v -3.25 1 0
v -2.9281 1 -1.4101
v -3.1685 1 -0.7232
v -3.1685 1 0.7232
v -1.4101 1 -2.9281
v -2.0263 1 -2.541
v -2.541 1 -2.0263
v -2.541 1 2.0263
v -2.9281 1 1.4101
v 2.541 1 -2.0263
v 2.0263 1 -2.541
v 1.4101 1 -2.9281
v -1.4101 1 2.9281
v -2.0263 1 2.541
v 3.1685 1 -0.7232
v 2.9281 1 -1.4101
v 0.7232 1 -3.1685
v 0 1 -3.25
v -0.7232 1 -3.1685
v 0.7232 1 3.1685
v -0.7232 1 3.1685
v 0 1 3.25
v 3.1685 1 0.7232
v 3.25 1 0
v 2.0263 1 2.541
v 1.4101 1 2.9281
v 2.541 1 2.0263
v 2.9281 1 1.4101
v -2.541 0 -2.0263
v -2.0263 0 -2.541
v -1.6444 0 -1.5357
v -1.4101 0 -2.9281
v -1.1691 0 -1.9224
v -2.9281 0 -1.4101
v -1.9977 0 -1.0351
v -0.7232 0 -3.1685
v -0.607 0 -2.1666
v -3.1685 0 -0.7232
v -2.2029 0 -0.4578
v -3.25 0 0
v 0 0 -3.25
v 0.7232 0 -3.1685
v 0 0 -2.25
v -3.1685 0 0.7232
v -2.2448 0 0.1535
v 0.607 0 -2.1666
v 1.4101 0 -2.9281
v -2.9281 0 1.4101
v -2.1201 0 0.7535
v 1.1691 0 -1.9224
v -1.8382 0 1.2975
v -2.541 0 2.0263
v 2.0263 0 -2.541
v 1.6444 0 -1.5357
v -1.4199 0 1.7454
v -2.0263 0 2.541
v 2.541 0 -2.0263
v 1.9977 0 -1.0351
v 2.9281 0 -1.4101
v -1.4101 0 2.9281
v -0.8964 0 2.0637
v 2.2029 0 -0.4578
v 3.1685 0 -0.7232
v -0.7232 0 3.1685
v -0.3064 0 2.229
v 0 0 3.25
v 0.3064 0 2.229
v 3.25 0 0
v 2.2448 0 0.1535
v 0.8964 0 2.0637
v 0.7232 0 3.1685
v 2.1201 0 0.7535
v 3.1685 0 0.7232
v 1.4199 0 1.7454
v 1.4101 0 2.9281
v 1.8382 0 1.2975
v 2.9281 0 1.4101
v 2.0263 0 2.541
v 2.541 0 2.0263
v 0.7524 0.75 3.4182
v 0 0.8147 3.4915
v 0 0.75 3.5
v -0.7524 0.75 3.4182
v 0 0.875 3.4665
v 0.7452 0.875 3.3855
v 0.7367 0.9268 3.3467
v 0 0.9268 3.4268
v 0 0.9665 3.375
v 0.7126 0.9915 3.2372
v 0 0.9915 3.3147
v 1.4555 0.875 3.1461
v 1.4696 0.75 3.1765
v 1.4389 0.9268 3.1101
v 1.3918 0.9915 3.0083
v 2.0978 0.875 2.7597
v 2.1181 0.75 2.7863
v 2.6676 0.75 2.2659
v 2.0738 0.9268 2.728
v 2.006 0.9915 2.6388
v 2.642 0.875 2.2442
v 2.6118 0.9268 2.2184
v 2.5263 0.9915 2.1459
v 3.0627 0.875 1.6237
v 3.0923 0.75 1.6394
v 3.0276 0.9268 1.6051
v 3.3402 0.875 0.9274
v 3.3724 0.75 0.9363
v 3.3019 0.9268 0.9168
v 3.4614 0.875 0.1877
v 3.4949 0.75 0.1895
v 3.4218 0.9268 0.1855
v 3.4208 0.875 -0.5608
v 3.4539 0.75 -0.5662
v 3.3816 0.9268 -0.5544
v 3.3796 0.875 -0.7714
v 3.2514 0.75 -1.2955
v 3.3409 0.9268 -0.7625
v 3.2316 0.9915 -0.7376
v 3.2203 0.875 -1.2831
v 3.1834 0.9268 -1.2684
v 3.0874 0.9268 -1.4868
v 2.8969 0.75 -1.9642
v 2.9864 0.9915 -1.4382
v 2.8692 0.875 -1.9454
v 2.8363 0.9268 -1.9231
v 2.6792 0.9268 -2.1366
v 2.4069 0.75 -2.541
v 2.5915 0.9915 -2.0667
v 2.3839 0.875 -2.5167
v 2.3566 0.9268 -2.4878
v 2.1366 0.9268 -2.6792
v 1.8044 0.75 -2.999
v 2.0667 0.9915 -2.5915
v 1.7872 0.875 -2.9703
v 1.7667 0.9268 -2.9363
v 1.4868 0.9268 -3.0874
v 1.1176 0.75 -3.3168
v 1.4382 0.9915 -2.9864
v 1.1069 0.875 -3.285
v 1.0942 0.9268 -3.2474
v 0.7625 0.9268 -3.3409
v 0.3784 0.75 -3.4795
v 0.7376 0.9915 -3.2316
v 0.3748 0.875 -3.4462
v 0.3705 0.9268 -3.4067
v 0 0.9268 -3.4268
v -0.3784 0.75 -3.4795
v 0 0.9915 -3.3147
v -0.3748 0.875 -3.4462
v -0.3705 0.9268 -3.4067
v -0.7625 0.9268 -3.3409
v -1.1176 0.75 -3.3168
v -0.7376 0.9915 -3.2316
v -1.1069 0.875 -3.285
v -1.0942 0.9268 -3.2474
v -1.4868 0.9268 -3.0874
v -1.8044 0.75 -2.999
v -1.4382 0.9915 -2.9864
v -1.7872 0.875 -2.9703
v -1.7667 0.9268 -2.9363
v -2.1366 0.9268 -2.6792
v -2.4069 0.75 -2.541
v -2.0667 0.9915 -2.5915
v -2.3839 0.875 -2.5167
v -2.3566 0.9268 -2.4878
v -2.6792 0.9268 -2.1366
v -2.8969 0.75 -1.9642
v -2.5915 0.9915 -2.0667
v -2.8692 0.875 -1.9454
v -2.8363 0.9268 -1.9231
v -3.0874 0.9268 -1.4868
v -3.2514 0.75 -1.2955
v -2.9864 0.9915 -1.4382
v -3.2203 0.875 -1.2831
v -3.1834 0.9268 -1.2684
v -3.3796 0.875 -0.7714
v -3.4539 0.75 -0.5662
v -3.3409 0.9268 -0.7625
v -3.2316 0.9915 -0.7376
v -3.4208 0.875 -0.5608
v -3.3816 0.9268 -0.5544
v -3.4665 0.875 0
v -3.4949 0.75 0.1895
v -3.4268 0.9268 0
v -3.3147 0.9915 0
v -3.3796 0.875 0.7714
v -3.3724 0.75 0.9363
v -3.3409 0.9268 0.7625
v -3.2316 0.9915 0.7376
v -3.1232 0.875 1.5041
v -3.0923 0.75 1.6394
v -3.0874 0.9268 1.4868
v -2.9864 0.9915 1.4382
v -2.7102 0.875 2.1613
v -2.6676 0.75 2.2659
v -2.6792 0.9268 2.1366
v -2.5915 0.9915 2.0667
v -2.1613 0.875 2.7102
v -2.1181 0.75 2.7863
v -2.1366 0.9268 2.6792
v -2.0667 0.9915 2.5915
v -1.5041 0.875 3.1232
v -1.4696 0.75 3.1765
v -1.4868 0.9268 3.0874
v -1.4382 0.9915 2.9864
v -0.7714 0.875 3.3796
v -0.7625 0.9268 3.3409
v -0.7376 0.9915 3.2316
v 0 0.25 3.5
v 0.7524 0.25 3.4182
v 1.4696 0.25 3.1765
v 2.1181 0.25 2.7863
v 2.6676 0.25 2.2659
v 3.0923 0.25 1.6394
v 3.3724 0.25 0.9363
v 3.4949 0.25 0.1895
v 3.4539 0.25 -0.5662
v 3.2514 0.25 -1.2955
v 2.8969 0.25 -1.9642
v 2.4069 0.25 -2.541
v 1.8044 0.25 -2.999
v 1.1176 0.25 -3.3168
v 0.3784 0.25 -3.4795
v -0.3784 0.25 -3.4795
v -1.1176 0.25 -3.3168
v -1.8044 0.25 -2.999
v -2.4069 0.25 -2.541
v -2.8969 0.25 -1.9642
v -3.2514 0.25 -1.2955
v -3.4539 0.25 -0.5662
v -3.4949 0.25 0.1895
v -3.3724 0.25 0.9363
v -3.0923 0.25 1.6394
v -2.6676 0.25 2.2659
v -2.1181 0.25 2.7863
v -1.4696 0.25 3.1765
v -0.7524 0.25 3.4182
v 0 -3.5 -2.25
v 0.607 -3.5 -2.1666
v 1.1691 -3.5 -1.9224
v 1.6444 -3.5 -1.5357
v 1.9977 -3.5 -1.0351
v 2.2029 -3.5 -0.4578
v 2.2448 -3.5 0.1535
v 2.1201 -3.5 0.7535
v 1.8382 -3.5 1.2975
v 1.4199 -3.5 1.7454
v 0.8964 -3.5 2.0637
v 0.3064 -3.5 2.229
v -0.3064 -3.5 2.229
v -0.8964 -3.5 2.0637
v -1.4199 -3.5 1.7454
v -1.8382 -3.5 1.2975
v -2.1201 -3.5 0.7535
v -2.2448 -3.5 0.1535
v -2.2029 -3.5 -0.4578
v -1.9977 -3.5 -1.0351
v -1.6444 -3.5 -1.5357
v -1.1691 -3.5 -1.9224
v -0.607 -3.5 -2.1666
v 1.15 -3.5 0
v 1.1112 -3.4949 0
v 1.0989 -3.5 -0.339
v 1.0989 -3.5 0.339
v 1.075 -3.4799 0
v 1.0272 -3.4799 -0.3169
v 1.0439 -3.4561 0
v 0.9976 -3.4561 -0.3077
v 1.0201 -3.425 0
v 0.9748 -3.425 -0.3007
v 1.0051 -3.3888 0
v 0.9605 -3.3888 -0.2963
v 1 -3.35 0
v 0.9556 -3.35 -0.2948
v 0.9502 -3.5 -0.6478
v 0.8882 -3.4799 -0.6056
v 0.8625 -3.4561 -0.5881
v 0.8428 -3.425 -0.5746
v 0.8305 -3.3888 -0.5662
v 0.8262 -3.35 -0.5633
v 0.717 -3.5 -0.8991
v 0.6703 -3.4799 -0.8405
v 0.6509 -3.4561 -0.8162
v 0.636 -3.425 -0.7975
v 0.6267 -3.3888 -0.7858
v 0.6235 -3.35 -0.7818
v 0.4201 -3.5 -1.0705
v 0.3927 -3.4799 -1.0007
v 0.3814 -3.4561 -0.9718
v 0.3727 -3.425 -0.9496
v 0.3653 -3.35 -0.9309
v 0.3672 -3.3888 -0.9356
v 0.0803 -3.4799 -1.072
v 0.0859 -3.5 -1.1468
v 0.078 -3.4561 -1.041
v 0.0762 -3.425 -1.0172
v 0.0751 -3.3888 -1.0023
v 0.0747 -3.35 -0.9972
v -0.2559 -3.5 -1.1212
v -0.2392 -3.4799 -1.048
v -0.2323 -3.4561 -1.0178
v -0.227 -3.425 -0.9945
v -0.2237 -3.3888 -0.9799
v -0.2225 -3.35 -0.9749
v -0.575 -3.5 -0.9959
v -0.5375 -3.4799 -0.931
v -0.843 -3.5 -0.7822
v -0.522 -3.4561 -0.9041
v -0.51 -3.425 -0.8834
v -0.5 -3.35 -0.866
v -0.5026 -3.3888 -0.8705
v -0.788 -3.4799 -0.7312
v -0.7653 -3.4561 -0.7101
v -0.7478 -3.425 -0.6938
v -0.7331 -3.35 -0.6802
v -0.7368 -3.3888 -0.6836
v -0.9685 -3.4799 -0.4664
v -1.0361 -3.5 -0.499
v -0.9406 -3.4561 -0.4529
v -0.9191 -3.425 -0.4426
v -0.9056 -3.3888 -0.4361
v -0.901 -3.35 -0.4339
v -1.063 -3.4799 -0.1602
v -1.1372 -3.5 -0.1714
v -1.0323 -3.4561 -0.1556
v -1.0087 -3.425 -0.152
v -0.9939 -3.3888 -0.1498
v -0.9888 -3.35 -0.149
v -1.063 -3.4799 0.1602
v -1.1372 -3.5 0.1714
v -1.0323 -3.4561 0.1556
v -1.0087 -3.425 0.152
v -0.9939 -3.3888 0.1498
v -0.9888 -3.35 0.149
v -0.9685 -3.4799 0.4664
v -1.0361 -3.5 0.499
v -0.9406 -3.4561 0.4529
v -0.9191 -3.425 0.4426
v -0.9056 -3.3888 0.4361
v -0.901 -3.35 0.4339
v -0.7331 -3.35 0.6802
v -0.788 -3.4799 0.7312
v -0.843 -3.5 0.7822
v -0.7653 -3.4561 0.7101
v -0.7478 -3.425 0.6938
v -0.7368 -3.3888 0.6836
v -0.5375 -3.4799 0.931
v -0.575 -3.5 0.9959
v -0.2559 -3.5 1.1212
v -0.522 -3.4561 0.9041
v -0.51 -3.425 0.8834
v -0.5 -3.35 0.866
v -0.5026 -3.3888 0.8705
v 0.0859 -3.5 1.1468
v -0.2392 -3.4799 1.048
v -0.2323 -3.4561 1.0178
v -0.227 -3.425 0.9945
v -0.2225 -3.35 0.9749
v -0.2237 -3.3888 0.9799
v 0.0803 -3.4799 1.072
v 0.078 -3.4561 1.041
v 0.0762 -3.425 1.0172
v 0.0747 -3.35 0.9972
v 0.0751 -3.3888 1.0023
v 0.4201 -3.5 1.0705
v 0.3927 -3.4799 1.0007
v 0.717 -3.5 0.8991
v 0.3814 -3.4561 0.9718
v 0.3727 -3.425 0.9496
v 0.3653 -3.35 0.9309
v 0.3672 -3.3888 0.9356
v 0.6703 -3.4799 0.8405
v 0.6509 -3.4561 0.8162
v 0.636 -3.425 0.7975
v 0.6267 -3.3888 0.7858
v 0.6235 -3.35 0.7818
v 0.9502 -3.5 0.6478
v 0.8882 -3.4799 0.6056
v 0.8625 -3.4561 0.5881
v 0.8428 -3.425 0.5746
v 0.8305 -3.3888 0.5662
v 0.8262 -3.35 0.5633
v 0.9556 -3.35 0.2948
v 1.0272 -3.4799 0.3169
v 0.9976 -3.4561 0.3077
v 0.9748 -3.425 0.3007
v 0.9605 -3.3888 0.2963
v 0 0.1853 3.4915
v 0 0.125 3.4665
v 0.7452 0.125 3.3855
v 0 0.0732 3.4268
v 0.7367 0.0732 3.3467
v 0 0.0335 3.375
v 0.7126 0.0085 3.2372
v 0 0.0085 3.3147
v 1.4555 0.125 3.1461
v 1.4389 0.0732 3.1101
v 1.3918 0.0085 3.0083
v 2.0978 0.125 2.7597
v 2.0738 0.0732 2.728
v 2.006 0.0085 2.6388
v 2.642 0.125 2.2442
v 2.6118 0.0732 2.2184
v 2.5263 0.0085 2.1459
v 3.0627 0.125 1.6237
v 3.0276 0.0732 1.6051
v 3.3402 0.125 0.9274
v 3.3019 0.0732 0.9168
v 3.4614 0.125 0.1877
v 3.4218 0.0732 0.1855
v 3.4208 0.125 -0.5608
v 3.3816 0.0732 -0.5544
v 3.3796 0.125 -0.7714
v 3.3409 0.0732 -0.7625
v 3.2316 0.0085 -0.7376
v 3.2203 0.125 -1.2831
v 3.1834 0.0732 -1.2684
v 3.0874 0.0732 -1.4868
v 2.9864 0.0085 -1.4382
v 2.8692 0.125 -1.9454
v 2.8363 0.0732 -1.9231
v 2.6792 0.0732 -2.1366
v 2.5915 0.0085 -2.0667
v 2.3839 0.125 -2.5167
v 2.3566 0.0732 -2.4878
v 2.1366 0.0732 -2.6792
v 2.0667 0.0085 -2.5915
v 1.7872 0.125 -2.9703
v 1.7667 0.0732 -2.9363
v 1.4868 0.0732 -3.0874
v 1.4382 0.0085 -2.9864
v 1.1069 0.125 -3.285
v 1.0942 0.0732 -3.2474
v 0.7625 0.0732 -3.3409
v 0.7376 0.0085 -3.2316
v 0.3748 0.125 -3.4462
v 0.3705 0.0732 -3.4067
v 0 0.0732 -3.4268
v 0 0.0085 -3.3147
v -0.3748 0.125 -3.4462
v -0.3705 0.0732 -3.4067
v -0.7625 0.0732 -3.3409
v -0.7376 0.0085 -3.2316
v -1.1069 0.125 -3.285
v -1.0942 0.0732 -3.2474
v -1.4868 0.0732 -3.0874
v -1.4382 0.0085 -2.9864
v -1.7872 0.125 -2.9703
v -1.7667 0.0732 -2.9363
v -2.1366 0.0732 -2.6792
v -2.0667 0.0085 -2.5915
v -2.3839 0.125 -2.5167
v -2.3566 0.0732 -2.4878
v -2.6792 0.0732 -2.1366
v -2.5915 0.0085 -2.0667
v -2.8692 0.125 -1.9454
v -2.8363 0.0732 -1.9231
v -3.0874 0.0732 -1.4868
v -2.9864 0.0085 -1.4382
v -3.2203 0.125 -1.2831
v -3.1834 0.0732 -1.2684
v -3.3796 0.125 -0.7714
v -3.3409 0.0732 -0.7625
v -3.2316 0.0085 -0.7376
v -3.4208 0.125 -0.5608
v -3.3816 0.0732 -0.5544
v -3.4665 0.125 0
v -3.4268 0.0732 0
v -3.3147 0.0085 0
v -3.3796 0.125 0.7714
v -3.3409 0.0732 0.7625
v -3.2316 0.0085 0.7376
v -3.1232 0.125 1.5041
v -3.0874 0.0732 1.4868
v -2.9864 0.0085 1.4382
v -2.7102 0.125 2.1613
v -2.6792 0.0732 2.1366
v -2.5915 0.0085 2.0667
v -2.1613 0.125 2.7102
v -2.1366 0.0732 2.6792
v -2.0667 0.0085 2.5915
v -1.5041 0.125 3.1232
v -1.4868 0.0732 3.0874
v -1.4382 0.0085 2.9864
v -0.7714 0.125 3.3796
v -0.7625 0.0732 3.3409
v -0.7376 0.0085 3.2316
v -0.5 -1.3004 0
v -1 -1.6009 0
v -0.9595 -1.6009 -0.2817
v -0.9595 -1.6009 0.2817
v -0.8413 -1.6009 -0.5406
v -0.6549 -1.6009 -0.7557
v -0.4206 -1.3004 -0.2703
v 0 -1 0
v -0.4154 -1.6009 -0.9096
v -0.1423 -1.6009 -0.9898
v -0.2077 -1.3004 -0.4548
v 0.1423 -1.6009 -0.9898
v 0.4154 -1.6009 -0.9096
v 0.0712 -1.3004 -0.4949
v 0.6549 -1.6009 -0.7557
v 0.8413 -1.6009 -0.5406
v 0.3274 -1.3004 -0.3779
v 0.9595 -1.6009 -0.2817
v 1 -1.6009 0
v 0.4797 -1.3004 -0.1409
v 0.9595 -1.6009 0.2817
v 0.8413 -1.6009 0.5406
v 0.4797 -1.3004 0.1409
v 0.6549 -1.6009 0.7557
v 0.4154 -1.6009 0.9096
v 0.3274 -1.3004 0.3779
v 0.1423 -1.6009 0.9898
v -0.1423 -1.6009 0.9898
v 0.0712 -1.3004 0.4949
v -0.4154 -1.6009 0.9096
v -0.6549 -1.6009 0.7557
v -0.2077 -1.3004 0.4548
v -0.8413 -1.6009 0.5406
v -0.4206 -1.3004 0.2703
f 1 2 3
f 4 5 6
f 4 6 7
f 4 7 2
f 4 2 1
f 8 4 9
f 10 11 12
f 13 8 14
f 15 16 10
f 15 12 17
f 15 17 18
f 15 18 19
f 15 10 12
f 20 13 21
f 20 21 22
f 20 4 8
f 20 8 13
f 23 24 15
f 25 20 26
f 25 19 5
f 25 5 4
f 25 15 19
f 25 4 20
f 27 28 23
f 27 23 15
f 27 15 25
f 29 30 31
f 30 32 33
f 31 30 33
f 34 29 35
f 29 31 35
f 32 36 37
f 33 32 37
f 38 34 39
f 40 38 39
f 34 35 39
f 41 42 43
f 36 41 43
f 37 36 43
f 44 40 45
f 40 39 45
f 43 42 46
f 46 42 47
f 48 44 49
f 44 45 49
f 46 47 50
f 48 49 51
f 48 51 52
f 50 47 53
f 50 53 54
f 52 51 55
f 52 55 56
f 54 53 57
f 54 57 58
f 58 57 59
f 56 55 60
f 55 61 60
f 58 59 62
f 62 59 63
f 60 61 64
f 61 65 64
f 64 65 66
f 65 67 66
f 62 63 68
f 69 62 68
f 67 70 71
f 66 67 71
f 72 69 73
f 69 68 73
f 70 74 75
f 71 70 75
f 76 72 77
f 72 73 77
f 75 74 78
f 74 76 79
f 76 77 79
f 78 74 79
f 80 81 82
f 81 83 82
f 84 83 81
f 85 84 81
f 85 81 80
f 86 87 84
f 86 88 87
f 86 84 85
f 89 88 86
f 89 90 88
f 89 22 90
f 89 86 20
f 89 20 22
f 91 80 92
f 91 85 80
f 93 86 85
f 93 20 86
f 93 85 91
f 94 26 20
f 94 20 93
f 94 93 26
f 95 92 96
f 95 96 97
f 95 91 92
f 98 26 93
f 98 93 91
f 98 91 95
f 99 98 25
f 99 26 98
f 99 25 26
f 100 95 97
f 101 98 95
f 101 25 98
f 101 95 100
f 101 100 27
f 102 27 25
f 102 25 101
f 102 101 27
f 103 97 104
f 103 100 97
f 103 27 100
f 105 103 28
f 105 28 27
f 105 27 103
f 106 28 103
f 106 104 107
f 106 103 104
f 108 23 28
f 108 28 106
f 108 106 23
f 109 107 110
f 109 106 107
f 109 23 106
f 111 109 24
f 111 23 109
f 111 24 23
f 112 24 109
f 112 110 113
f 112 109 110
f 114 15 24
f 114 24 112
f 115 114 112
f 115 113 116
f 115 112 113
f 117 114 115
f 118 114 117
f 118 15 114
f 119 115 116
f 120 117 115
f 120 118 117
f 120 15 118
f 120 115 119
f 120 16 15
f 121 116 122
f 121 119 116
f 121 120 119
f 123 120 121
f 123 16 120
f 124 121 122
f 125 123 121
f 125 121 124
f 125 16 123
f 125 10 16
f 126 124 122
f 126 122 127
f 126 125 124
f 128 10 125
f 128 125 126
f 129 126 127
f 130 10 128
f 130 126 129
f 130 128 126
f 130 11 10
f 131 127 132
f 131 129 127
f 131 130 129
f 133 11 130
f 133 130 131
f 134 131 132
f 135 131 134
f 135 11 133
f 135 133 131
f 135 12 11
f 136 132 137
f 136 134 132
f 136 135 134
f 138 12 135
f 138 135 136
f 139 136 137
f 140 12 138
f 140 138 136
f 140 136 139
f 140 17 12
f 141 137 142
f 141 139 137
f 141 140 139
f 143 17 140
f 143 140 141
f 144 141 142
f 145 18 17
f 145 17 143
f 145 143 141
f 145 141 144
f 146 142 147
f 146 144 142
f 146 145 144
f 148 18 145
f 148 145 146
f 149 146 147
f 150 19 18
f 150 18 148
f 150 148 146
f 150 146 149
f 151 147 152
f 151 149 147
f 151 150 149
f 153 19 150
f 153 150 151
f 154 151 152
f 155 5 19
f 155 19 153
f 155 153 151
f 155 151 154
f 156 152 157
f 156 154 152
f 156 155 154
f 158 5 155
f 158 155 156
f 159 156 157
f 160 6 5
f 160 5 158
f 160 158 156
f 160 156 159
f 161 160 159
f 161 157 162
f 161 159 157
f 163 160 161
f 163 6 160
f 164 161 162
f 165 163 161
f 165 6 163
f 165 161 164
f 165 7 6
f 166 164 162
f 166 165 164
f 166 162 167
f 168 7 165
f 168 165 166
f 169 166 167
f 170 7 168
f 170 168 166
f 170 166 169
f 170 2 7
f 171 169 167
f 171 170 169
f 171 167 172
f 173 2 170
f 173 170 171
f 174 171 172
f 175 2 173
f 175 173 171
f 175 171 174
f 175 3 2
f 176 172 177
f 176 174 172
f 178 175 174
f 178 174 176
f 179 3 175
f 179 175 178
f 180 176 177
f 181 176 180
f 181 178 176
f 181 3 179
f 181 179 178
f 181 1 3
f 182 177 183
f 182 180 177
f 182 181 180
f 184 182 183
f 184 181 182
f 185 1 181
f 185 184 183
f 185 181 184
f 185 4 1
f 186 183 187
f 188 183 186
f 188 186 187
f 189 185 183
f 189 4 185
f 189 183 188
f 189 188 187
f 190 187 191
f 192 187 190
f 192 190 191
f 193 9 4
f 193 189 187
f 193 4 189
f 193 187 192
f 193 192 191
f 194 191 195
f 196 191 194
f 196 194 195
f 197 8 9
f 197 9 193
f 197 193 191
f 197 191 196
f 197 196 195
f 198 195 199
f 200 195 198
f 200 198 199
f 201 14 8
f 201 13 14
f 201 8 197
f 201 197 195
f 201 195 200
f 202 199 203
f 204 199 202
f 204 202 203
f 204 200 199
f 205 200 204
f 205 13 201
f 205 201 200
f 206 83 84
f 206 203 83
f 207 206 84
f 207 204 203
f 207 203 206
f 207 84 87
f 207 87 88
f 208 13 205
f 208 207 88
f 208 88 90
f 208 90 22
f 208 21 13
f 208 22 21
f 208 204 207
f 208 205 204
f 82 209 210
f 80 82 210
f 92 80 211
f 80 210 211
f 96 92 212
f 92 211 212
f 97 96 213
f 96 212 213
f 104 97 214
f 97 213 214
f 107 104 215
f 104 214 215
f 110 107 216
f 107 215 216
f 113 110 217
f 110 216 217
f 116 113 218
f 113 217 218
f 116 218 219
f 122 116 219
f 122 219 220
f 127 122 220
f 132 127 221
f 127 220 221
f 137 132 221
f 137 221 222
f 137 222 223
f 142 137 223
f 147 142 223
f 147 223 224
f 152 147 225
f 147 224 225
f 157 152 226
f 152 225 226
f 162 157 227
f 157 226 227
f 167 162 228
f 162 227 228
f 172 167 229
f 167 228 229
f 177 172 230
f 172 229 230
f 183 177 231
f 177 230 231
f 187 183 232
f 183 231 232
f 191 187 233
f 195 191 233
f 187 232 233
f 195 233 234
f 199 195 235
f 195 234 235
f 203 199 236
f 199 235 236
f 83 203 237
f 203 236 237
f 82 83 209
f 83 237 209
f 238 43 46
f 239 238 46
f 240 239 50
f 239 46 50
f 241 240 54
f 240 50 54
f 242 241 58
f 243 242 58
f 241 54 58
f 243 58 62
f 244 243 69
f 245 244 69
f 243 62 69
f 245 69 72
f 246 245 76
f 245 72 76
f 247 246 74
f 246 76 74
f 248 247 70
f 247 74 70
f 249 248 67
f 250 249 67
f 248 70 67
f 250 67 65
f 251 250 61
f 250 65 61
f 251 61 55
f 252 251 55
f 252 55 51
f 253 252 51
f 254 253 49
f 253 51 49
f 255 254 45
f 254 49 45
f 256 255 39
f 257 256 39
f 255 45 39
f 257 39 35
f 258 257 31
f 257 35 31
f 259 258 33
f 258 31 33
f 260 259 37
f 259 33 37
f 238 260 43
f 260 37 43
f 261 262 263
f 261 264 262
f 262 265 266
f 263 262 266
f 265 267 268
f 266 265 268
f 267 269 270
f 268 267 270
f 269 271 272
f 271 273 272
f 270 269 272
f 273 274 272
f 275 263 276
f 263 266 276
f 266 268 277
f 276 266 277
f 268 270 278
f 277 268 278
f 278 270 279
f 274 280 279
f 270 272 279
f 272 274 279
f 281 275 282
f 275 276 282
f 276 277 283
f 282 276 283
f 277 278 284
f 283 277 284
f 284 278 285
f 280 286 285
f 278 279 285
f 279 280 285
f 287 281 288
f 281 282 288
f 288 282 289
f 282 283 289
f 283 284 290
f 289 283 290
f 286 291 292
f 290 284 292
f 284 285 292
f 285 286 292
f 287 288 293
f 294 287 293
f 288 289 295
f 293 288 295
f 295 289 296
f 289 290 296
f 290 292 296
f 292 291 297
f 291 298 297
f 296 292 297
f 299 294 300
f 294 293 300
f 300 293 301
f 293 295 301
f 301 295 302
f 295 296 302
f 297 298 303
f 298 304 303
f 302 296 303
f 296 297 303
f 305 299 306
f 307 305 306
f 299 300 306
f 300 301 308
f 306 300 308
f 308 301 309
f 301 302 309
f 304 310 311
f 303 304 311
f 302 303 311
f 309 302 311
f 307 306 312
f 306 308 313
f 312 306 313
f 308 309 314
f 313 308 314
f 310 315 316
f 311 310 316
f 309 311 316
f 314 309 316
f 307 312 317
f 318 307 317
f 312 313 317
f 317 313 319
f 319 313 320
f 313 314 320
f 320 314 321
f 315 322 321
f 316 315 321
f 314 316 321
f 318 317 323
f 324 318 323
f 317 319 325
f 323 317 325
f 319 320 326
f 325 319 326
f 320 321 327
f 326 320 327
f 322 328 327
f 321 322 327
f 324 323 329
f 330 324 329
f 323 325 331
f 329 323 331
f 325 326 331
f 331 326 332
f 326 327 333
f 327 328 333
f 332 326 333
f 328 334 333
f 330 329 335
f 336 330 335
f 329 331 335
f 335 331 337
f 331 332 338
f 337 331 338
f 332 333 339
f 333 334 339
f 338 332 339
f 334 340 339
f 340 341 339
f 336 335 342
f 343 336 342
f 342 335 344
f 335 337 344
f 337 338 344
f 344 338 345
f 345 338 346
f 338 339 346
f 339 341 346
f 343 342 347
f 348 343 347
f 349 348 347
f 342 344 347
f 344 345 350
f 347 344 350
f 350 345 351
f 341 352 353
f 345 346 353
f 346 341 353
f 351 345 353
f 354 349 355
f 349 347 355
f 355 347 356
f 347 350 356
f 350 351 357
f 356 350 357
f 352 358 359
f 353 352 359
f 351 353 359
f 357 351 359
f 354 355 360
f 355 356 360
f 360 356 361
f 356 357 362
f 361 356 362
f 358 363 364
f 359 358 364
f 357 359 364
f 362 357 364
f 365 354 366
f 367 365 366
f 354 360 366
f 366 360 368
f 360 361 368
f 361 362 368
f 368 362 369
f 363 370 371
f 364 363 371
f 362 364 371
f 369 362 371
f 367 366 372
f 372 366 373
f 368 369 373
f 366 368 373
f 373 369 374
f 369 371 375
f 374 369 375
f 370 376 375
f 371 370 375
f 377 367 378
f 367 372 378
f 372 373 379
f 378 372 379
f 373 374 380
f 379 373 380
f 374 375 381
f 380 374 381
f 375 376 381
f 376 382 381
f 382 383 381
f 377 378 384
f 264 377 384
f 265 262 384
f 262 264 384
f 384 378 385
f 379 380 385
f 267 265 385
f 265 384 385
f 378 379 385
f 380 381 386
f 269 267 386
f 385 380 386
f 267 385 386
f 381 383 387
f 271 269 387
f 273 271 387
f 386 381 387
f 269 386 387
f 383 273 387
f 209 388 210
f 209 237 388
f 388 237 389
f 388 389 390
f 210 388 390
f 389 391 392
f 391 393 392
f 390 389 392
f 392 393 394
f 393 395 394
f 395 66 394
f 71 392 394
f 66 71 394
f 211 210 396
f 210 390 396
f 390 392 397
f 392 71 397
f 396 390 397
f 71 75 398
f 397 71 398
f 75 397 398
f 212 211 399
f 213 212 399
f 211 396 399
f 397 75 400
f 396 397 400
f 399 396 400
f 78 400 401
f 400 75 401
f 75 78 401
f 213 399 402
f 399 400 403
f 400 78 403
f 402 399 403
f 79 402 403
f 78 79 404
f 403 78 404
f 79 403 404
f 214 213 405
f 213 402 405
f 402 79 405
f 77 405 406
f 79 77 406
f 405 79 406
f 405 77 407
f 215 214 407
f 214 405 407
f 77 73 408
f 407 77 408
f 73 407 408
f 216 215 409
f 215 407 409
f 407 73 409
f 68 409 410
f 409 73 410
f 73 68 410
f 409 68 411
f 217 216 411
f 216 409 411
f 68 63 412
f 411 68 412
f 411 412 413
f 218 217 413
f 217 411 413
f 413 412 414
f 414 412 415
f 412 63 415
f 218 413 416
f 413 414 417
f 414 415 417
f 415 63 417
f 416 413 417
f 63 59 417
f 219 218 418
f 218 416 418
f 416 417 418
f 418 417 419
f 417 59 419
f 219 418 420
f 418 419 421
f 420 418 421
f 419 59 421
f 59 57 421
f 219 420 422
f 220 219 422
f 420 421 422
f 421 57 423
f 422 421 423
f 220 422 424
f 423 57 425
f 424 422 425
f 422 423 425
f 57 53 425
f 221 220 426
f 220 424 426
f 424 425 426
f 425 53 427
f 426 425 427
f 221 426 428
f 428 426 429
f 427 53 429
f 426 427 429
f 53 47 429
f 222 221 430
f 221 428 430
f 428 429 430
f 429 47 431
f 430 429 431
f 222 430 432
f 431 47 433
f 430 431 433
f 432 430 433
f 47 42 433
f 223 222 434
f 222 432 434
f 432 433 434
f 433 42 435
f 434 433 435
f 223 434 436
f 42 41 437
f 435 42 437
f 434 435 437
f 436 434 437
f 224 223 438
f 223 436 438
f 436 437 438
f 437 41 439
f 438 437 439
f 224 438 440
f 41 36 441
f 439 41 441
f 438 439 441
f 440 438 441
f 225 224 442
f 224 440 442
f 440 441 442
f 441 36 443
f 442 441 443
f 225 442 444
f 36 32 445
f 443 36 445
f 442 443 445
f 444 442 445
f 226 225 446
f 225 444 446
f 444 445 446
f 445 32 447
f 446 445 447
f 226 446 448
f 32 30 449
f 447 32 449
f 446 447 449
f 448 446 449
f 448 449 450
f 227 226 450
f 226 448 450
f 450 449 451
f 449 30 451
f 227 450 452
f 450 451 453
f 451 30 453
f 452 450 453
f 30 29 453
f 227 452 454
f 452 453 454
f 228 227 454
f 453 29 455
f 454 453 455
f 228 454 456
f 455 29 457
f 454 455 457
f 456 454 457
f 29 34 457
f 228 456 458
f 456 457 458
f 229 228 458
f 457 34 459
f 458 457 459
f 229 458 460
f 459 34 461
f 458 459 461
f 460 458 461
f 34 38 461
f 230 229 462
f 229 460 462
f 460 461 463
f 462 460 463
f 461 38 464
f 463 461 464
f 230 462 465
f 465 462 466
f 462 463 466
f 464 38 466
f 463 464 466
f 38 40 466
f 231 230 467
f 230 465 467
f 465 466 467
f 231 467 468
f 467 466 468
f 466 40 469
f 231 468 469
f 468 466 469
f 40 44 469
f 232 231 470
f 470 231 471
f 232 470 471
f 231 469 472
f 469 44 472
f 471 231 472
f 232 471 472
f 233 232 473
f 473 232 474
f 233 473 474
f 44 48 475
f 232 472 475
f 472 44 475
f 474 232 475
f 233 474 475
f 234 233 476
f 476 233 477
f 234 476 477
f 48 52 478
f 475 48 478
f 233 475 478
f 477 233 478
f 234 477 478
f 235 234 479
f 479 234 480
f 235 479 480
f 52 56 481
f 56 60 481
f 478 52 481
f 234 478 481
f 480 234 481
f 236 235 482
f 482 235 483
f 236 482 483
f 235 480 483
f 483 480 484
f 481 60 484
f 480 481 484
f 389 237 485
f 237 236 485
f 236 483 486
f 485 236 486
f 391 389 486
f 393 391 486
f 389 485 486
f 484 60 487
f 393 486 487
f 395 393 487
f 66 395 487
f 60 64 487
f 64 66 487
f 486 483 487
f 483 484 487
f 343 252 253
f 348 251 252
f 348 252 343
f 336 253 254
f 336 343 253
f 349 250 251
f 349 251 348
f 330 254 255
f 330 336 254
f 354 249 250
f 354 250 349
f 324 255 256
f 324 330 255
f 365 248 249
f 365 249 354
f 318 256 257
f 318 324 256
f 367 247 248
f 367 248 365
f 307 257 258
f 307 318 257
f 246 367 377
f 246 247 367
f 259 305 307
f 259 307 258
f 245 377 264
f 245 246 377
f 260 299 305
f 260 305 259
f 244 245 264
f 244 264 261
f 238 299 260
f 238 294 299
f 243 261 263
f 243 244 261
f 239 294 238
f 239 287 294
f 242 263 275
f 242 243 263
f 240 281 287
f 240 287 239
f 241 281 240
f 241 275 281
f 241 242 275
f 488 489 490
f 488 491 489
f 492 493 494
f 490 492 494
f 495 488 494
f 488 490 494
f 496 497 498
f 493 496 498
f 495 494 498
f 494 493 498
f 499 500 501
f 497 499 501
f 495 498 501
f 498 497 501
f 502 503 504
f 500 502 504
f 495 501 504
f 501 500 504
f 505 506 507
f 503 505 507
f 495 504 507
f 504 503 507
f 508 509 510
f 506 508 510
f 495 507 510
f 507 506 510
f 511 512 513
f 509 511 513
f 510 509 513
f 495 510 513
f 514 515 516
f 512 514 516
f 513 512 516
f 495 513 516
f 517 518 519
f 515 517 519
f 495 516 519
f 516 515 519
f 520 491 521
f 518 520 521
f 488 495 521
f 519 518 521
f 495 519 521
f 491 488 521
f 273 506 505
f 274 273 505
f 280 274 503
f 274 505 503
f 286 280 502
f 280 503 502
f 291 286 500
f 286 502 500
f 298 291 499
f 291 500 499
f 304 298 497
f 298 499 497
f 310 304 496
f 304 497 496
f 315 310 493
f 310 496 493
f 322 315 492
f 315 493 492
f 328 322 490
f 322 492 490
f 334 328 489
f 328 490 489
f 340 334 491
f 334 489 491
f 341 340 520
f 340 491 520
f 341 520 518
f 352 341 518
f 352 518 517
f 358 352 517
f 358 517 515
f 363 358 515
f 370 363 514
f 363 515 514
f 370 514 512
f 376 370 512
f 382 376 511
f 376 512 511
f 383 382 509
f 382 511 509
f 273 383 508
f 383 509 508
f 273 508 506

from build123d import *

# Parameters (mm, degrees)
SKETCH1_R                              = 3.5
BOSS_EXTRUDE1_DEPTH                    = 1
SKETCH3_R                              = 2.25
BOSS_EXTRUDE3_DEPTH                    = 3.5
FILLET1_R                              = 0.25
F_1_16_0_07874016_DIAMETER_HOLE1_D     = 2.000000064
F_1_16_0_07874016_DIAMETER_HOLE1_DEPTH = 1.899139362
F_1_16_0_07874016_DIAMETER_HOLE1_TIP   = 0.600860638
FILLET2_R                              = 0.15


with BuildPart() as part:
    # Sketch1 → Boss-Extrude1 (new body)
    with BuildSketch(Plane(origin=(0, 0, 0), x_dir=(1, 0, 0), z_dir=(0, 1, 0))):
        with Locations(Location((0, 0, 0), (0, 0, 270))):
            Circle(SKETCH1_R)
    extrude(amount=BOSS_EXTRUDE1_DEPTH)

    # Sketch3 → Boss-Extrude3 (add)
    with BuildSketch(Plane.XZ):
        with Locations(Location((0, 0, 0), (0, 0, 270))):
            Circle(SKETCH3_R)
    extrude(amount=BOSS_EXTRUDE3_DEPTH)

    # Fillet1
    fillet1_edges = [part.edges().sort_by_distance(p)[0] for p in [
        (0, 0, -3.5),
        (0, 1, -3.5),
    ]]
    fillet(fillet1_edges, radius=FILLET1_R)

    # 1/16 (0.07874016) Diameter Hole1
    with Locations(Plane(origin=(0, -3.5, 0), x_dir=(-1, 0, 0), z_dir=(0, -1, 0))):
        with Locations((0, 0)):
            Hole(F_1_16_0_07874016_DIAMETER_HOLE1_D / 2, depth=F_1_16_0_07874016_DIAMETER_HOLE1_DEPTH)
            with Locations((0, 0, -(F_1_16_0_07874016_DIAMETER_HOLE1_DEPTH + F_1_16_0_07874016_DIAMETER_HOLE1_TIP / 2))):  # 118° drill point
                Cone(0, F_1_16_0_07874016_DIAMETER_HOLE1_D / 2, F_1_16_0_07874016_DIAMETER_HOLE1_TIP, mode=Mode.SUBTRACT)

    # Fillet2
    fillet2_edges = [part.edges().sort_by_distance(p)[0] for p in [
        (-1.000000032, -3.5, 0),
    ]]
    fillet(fillet2_edges, radius=FILLET2_R)


solid = part.part
